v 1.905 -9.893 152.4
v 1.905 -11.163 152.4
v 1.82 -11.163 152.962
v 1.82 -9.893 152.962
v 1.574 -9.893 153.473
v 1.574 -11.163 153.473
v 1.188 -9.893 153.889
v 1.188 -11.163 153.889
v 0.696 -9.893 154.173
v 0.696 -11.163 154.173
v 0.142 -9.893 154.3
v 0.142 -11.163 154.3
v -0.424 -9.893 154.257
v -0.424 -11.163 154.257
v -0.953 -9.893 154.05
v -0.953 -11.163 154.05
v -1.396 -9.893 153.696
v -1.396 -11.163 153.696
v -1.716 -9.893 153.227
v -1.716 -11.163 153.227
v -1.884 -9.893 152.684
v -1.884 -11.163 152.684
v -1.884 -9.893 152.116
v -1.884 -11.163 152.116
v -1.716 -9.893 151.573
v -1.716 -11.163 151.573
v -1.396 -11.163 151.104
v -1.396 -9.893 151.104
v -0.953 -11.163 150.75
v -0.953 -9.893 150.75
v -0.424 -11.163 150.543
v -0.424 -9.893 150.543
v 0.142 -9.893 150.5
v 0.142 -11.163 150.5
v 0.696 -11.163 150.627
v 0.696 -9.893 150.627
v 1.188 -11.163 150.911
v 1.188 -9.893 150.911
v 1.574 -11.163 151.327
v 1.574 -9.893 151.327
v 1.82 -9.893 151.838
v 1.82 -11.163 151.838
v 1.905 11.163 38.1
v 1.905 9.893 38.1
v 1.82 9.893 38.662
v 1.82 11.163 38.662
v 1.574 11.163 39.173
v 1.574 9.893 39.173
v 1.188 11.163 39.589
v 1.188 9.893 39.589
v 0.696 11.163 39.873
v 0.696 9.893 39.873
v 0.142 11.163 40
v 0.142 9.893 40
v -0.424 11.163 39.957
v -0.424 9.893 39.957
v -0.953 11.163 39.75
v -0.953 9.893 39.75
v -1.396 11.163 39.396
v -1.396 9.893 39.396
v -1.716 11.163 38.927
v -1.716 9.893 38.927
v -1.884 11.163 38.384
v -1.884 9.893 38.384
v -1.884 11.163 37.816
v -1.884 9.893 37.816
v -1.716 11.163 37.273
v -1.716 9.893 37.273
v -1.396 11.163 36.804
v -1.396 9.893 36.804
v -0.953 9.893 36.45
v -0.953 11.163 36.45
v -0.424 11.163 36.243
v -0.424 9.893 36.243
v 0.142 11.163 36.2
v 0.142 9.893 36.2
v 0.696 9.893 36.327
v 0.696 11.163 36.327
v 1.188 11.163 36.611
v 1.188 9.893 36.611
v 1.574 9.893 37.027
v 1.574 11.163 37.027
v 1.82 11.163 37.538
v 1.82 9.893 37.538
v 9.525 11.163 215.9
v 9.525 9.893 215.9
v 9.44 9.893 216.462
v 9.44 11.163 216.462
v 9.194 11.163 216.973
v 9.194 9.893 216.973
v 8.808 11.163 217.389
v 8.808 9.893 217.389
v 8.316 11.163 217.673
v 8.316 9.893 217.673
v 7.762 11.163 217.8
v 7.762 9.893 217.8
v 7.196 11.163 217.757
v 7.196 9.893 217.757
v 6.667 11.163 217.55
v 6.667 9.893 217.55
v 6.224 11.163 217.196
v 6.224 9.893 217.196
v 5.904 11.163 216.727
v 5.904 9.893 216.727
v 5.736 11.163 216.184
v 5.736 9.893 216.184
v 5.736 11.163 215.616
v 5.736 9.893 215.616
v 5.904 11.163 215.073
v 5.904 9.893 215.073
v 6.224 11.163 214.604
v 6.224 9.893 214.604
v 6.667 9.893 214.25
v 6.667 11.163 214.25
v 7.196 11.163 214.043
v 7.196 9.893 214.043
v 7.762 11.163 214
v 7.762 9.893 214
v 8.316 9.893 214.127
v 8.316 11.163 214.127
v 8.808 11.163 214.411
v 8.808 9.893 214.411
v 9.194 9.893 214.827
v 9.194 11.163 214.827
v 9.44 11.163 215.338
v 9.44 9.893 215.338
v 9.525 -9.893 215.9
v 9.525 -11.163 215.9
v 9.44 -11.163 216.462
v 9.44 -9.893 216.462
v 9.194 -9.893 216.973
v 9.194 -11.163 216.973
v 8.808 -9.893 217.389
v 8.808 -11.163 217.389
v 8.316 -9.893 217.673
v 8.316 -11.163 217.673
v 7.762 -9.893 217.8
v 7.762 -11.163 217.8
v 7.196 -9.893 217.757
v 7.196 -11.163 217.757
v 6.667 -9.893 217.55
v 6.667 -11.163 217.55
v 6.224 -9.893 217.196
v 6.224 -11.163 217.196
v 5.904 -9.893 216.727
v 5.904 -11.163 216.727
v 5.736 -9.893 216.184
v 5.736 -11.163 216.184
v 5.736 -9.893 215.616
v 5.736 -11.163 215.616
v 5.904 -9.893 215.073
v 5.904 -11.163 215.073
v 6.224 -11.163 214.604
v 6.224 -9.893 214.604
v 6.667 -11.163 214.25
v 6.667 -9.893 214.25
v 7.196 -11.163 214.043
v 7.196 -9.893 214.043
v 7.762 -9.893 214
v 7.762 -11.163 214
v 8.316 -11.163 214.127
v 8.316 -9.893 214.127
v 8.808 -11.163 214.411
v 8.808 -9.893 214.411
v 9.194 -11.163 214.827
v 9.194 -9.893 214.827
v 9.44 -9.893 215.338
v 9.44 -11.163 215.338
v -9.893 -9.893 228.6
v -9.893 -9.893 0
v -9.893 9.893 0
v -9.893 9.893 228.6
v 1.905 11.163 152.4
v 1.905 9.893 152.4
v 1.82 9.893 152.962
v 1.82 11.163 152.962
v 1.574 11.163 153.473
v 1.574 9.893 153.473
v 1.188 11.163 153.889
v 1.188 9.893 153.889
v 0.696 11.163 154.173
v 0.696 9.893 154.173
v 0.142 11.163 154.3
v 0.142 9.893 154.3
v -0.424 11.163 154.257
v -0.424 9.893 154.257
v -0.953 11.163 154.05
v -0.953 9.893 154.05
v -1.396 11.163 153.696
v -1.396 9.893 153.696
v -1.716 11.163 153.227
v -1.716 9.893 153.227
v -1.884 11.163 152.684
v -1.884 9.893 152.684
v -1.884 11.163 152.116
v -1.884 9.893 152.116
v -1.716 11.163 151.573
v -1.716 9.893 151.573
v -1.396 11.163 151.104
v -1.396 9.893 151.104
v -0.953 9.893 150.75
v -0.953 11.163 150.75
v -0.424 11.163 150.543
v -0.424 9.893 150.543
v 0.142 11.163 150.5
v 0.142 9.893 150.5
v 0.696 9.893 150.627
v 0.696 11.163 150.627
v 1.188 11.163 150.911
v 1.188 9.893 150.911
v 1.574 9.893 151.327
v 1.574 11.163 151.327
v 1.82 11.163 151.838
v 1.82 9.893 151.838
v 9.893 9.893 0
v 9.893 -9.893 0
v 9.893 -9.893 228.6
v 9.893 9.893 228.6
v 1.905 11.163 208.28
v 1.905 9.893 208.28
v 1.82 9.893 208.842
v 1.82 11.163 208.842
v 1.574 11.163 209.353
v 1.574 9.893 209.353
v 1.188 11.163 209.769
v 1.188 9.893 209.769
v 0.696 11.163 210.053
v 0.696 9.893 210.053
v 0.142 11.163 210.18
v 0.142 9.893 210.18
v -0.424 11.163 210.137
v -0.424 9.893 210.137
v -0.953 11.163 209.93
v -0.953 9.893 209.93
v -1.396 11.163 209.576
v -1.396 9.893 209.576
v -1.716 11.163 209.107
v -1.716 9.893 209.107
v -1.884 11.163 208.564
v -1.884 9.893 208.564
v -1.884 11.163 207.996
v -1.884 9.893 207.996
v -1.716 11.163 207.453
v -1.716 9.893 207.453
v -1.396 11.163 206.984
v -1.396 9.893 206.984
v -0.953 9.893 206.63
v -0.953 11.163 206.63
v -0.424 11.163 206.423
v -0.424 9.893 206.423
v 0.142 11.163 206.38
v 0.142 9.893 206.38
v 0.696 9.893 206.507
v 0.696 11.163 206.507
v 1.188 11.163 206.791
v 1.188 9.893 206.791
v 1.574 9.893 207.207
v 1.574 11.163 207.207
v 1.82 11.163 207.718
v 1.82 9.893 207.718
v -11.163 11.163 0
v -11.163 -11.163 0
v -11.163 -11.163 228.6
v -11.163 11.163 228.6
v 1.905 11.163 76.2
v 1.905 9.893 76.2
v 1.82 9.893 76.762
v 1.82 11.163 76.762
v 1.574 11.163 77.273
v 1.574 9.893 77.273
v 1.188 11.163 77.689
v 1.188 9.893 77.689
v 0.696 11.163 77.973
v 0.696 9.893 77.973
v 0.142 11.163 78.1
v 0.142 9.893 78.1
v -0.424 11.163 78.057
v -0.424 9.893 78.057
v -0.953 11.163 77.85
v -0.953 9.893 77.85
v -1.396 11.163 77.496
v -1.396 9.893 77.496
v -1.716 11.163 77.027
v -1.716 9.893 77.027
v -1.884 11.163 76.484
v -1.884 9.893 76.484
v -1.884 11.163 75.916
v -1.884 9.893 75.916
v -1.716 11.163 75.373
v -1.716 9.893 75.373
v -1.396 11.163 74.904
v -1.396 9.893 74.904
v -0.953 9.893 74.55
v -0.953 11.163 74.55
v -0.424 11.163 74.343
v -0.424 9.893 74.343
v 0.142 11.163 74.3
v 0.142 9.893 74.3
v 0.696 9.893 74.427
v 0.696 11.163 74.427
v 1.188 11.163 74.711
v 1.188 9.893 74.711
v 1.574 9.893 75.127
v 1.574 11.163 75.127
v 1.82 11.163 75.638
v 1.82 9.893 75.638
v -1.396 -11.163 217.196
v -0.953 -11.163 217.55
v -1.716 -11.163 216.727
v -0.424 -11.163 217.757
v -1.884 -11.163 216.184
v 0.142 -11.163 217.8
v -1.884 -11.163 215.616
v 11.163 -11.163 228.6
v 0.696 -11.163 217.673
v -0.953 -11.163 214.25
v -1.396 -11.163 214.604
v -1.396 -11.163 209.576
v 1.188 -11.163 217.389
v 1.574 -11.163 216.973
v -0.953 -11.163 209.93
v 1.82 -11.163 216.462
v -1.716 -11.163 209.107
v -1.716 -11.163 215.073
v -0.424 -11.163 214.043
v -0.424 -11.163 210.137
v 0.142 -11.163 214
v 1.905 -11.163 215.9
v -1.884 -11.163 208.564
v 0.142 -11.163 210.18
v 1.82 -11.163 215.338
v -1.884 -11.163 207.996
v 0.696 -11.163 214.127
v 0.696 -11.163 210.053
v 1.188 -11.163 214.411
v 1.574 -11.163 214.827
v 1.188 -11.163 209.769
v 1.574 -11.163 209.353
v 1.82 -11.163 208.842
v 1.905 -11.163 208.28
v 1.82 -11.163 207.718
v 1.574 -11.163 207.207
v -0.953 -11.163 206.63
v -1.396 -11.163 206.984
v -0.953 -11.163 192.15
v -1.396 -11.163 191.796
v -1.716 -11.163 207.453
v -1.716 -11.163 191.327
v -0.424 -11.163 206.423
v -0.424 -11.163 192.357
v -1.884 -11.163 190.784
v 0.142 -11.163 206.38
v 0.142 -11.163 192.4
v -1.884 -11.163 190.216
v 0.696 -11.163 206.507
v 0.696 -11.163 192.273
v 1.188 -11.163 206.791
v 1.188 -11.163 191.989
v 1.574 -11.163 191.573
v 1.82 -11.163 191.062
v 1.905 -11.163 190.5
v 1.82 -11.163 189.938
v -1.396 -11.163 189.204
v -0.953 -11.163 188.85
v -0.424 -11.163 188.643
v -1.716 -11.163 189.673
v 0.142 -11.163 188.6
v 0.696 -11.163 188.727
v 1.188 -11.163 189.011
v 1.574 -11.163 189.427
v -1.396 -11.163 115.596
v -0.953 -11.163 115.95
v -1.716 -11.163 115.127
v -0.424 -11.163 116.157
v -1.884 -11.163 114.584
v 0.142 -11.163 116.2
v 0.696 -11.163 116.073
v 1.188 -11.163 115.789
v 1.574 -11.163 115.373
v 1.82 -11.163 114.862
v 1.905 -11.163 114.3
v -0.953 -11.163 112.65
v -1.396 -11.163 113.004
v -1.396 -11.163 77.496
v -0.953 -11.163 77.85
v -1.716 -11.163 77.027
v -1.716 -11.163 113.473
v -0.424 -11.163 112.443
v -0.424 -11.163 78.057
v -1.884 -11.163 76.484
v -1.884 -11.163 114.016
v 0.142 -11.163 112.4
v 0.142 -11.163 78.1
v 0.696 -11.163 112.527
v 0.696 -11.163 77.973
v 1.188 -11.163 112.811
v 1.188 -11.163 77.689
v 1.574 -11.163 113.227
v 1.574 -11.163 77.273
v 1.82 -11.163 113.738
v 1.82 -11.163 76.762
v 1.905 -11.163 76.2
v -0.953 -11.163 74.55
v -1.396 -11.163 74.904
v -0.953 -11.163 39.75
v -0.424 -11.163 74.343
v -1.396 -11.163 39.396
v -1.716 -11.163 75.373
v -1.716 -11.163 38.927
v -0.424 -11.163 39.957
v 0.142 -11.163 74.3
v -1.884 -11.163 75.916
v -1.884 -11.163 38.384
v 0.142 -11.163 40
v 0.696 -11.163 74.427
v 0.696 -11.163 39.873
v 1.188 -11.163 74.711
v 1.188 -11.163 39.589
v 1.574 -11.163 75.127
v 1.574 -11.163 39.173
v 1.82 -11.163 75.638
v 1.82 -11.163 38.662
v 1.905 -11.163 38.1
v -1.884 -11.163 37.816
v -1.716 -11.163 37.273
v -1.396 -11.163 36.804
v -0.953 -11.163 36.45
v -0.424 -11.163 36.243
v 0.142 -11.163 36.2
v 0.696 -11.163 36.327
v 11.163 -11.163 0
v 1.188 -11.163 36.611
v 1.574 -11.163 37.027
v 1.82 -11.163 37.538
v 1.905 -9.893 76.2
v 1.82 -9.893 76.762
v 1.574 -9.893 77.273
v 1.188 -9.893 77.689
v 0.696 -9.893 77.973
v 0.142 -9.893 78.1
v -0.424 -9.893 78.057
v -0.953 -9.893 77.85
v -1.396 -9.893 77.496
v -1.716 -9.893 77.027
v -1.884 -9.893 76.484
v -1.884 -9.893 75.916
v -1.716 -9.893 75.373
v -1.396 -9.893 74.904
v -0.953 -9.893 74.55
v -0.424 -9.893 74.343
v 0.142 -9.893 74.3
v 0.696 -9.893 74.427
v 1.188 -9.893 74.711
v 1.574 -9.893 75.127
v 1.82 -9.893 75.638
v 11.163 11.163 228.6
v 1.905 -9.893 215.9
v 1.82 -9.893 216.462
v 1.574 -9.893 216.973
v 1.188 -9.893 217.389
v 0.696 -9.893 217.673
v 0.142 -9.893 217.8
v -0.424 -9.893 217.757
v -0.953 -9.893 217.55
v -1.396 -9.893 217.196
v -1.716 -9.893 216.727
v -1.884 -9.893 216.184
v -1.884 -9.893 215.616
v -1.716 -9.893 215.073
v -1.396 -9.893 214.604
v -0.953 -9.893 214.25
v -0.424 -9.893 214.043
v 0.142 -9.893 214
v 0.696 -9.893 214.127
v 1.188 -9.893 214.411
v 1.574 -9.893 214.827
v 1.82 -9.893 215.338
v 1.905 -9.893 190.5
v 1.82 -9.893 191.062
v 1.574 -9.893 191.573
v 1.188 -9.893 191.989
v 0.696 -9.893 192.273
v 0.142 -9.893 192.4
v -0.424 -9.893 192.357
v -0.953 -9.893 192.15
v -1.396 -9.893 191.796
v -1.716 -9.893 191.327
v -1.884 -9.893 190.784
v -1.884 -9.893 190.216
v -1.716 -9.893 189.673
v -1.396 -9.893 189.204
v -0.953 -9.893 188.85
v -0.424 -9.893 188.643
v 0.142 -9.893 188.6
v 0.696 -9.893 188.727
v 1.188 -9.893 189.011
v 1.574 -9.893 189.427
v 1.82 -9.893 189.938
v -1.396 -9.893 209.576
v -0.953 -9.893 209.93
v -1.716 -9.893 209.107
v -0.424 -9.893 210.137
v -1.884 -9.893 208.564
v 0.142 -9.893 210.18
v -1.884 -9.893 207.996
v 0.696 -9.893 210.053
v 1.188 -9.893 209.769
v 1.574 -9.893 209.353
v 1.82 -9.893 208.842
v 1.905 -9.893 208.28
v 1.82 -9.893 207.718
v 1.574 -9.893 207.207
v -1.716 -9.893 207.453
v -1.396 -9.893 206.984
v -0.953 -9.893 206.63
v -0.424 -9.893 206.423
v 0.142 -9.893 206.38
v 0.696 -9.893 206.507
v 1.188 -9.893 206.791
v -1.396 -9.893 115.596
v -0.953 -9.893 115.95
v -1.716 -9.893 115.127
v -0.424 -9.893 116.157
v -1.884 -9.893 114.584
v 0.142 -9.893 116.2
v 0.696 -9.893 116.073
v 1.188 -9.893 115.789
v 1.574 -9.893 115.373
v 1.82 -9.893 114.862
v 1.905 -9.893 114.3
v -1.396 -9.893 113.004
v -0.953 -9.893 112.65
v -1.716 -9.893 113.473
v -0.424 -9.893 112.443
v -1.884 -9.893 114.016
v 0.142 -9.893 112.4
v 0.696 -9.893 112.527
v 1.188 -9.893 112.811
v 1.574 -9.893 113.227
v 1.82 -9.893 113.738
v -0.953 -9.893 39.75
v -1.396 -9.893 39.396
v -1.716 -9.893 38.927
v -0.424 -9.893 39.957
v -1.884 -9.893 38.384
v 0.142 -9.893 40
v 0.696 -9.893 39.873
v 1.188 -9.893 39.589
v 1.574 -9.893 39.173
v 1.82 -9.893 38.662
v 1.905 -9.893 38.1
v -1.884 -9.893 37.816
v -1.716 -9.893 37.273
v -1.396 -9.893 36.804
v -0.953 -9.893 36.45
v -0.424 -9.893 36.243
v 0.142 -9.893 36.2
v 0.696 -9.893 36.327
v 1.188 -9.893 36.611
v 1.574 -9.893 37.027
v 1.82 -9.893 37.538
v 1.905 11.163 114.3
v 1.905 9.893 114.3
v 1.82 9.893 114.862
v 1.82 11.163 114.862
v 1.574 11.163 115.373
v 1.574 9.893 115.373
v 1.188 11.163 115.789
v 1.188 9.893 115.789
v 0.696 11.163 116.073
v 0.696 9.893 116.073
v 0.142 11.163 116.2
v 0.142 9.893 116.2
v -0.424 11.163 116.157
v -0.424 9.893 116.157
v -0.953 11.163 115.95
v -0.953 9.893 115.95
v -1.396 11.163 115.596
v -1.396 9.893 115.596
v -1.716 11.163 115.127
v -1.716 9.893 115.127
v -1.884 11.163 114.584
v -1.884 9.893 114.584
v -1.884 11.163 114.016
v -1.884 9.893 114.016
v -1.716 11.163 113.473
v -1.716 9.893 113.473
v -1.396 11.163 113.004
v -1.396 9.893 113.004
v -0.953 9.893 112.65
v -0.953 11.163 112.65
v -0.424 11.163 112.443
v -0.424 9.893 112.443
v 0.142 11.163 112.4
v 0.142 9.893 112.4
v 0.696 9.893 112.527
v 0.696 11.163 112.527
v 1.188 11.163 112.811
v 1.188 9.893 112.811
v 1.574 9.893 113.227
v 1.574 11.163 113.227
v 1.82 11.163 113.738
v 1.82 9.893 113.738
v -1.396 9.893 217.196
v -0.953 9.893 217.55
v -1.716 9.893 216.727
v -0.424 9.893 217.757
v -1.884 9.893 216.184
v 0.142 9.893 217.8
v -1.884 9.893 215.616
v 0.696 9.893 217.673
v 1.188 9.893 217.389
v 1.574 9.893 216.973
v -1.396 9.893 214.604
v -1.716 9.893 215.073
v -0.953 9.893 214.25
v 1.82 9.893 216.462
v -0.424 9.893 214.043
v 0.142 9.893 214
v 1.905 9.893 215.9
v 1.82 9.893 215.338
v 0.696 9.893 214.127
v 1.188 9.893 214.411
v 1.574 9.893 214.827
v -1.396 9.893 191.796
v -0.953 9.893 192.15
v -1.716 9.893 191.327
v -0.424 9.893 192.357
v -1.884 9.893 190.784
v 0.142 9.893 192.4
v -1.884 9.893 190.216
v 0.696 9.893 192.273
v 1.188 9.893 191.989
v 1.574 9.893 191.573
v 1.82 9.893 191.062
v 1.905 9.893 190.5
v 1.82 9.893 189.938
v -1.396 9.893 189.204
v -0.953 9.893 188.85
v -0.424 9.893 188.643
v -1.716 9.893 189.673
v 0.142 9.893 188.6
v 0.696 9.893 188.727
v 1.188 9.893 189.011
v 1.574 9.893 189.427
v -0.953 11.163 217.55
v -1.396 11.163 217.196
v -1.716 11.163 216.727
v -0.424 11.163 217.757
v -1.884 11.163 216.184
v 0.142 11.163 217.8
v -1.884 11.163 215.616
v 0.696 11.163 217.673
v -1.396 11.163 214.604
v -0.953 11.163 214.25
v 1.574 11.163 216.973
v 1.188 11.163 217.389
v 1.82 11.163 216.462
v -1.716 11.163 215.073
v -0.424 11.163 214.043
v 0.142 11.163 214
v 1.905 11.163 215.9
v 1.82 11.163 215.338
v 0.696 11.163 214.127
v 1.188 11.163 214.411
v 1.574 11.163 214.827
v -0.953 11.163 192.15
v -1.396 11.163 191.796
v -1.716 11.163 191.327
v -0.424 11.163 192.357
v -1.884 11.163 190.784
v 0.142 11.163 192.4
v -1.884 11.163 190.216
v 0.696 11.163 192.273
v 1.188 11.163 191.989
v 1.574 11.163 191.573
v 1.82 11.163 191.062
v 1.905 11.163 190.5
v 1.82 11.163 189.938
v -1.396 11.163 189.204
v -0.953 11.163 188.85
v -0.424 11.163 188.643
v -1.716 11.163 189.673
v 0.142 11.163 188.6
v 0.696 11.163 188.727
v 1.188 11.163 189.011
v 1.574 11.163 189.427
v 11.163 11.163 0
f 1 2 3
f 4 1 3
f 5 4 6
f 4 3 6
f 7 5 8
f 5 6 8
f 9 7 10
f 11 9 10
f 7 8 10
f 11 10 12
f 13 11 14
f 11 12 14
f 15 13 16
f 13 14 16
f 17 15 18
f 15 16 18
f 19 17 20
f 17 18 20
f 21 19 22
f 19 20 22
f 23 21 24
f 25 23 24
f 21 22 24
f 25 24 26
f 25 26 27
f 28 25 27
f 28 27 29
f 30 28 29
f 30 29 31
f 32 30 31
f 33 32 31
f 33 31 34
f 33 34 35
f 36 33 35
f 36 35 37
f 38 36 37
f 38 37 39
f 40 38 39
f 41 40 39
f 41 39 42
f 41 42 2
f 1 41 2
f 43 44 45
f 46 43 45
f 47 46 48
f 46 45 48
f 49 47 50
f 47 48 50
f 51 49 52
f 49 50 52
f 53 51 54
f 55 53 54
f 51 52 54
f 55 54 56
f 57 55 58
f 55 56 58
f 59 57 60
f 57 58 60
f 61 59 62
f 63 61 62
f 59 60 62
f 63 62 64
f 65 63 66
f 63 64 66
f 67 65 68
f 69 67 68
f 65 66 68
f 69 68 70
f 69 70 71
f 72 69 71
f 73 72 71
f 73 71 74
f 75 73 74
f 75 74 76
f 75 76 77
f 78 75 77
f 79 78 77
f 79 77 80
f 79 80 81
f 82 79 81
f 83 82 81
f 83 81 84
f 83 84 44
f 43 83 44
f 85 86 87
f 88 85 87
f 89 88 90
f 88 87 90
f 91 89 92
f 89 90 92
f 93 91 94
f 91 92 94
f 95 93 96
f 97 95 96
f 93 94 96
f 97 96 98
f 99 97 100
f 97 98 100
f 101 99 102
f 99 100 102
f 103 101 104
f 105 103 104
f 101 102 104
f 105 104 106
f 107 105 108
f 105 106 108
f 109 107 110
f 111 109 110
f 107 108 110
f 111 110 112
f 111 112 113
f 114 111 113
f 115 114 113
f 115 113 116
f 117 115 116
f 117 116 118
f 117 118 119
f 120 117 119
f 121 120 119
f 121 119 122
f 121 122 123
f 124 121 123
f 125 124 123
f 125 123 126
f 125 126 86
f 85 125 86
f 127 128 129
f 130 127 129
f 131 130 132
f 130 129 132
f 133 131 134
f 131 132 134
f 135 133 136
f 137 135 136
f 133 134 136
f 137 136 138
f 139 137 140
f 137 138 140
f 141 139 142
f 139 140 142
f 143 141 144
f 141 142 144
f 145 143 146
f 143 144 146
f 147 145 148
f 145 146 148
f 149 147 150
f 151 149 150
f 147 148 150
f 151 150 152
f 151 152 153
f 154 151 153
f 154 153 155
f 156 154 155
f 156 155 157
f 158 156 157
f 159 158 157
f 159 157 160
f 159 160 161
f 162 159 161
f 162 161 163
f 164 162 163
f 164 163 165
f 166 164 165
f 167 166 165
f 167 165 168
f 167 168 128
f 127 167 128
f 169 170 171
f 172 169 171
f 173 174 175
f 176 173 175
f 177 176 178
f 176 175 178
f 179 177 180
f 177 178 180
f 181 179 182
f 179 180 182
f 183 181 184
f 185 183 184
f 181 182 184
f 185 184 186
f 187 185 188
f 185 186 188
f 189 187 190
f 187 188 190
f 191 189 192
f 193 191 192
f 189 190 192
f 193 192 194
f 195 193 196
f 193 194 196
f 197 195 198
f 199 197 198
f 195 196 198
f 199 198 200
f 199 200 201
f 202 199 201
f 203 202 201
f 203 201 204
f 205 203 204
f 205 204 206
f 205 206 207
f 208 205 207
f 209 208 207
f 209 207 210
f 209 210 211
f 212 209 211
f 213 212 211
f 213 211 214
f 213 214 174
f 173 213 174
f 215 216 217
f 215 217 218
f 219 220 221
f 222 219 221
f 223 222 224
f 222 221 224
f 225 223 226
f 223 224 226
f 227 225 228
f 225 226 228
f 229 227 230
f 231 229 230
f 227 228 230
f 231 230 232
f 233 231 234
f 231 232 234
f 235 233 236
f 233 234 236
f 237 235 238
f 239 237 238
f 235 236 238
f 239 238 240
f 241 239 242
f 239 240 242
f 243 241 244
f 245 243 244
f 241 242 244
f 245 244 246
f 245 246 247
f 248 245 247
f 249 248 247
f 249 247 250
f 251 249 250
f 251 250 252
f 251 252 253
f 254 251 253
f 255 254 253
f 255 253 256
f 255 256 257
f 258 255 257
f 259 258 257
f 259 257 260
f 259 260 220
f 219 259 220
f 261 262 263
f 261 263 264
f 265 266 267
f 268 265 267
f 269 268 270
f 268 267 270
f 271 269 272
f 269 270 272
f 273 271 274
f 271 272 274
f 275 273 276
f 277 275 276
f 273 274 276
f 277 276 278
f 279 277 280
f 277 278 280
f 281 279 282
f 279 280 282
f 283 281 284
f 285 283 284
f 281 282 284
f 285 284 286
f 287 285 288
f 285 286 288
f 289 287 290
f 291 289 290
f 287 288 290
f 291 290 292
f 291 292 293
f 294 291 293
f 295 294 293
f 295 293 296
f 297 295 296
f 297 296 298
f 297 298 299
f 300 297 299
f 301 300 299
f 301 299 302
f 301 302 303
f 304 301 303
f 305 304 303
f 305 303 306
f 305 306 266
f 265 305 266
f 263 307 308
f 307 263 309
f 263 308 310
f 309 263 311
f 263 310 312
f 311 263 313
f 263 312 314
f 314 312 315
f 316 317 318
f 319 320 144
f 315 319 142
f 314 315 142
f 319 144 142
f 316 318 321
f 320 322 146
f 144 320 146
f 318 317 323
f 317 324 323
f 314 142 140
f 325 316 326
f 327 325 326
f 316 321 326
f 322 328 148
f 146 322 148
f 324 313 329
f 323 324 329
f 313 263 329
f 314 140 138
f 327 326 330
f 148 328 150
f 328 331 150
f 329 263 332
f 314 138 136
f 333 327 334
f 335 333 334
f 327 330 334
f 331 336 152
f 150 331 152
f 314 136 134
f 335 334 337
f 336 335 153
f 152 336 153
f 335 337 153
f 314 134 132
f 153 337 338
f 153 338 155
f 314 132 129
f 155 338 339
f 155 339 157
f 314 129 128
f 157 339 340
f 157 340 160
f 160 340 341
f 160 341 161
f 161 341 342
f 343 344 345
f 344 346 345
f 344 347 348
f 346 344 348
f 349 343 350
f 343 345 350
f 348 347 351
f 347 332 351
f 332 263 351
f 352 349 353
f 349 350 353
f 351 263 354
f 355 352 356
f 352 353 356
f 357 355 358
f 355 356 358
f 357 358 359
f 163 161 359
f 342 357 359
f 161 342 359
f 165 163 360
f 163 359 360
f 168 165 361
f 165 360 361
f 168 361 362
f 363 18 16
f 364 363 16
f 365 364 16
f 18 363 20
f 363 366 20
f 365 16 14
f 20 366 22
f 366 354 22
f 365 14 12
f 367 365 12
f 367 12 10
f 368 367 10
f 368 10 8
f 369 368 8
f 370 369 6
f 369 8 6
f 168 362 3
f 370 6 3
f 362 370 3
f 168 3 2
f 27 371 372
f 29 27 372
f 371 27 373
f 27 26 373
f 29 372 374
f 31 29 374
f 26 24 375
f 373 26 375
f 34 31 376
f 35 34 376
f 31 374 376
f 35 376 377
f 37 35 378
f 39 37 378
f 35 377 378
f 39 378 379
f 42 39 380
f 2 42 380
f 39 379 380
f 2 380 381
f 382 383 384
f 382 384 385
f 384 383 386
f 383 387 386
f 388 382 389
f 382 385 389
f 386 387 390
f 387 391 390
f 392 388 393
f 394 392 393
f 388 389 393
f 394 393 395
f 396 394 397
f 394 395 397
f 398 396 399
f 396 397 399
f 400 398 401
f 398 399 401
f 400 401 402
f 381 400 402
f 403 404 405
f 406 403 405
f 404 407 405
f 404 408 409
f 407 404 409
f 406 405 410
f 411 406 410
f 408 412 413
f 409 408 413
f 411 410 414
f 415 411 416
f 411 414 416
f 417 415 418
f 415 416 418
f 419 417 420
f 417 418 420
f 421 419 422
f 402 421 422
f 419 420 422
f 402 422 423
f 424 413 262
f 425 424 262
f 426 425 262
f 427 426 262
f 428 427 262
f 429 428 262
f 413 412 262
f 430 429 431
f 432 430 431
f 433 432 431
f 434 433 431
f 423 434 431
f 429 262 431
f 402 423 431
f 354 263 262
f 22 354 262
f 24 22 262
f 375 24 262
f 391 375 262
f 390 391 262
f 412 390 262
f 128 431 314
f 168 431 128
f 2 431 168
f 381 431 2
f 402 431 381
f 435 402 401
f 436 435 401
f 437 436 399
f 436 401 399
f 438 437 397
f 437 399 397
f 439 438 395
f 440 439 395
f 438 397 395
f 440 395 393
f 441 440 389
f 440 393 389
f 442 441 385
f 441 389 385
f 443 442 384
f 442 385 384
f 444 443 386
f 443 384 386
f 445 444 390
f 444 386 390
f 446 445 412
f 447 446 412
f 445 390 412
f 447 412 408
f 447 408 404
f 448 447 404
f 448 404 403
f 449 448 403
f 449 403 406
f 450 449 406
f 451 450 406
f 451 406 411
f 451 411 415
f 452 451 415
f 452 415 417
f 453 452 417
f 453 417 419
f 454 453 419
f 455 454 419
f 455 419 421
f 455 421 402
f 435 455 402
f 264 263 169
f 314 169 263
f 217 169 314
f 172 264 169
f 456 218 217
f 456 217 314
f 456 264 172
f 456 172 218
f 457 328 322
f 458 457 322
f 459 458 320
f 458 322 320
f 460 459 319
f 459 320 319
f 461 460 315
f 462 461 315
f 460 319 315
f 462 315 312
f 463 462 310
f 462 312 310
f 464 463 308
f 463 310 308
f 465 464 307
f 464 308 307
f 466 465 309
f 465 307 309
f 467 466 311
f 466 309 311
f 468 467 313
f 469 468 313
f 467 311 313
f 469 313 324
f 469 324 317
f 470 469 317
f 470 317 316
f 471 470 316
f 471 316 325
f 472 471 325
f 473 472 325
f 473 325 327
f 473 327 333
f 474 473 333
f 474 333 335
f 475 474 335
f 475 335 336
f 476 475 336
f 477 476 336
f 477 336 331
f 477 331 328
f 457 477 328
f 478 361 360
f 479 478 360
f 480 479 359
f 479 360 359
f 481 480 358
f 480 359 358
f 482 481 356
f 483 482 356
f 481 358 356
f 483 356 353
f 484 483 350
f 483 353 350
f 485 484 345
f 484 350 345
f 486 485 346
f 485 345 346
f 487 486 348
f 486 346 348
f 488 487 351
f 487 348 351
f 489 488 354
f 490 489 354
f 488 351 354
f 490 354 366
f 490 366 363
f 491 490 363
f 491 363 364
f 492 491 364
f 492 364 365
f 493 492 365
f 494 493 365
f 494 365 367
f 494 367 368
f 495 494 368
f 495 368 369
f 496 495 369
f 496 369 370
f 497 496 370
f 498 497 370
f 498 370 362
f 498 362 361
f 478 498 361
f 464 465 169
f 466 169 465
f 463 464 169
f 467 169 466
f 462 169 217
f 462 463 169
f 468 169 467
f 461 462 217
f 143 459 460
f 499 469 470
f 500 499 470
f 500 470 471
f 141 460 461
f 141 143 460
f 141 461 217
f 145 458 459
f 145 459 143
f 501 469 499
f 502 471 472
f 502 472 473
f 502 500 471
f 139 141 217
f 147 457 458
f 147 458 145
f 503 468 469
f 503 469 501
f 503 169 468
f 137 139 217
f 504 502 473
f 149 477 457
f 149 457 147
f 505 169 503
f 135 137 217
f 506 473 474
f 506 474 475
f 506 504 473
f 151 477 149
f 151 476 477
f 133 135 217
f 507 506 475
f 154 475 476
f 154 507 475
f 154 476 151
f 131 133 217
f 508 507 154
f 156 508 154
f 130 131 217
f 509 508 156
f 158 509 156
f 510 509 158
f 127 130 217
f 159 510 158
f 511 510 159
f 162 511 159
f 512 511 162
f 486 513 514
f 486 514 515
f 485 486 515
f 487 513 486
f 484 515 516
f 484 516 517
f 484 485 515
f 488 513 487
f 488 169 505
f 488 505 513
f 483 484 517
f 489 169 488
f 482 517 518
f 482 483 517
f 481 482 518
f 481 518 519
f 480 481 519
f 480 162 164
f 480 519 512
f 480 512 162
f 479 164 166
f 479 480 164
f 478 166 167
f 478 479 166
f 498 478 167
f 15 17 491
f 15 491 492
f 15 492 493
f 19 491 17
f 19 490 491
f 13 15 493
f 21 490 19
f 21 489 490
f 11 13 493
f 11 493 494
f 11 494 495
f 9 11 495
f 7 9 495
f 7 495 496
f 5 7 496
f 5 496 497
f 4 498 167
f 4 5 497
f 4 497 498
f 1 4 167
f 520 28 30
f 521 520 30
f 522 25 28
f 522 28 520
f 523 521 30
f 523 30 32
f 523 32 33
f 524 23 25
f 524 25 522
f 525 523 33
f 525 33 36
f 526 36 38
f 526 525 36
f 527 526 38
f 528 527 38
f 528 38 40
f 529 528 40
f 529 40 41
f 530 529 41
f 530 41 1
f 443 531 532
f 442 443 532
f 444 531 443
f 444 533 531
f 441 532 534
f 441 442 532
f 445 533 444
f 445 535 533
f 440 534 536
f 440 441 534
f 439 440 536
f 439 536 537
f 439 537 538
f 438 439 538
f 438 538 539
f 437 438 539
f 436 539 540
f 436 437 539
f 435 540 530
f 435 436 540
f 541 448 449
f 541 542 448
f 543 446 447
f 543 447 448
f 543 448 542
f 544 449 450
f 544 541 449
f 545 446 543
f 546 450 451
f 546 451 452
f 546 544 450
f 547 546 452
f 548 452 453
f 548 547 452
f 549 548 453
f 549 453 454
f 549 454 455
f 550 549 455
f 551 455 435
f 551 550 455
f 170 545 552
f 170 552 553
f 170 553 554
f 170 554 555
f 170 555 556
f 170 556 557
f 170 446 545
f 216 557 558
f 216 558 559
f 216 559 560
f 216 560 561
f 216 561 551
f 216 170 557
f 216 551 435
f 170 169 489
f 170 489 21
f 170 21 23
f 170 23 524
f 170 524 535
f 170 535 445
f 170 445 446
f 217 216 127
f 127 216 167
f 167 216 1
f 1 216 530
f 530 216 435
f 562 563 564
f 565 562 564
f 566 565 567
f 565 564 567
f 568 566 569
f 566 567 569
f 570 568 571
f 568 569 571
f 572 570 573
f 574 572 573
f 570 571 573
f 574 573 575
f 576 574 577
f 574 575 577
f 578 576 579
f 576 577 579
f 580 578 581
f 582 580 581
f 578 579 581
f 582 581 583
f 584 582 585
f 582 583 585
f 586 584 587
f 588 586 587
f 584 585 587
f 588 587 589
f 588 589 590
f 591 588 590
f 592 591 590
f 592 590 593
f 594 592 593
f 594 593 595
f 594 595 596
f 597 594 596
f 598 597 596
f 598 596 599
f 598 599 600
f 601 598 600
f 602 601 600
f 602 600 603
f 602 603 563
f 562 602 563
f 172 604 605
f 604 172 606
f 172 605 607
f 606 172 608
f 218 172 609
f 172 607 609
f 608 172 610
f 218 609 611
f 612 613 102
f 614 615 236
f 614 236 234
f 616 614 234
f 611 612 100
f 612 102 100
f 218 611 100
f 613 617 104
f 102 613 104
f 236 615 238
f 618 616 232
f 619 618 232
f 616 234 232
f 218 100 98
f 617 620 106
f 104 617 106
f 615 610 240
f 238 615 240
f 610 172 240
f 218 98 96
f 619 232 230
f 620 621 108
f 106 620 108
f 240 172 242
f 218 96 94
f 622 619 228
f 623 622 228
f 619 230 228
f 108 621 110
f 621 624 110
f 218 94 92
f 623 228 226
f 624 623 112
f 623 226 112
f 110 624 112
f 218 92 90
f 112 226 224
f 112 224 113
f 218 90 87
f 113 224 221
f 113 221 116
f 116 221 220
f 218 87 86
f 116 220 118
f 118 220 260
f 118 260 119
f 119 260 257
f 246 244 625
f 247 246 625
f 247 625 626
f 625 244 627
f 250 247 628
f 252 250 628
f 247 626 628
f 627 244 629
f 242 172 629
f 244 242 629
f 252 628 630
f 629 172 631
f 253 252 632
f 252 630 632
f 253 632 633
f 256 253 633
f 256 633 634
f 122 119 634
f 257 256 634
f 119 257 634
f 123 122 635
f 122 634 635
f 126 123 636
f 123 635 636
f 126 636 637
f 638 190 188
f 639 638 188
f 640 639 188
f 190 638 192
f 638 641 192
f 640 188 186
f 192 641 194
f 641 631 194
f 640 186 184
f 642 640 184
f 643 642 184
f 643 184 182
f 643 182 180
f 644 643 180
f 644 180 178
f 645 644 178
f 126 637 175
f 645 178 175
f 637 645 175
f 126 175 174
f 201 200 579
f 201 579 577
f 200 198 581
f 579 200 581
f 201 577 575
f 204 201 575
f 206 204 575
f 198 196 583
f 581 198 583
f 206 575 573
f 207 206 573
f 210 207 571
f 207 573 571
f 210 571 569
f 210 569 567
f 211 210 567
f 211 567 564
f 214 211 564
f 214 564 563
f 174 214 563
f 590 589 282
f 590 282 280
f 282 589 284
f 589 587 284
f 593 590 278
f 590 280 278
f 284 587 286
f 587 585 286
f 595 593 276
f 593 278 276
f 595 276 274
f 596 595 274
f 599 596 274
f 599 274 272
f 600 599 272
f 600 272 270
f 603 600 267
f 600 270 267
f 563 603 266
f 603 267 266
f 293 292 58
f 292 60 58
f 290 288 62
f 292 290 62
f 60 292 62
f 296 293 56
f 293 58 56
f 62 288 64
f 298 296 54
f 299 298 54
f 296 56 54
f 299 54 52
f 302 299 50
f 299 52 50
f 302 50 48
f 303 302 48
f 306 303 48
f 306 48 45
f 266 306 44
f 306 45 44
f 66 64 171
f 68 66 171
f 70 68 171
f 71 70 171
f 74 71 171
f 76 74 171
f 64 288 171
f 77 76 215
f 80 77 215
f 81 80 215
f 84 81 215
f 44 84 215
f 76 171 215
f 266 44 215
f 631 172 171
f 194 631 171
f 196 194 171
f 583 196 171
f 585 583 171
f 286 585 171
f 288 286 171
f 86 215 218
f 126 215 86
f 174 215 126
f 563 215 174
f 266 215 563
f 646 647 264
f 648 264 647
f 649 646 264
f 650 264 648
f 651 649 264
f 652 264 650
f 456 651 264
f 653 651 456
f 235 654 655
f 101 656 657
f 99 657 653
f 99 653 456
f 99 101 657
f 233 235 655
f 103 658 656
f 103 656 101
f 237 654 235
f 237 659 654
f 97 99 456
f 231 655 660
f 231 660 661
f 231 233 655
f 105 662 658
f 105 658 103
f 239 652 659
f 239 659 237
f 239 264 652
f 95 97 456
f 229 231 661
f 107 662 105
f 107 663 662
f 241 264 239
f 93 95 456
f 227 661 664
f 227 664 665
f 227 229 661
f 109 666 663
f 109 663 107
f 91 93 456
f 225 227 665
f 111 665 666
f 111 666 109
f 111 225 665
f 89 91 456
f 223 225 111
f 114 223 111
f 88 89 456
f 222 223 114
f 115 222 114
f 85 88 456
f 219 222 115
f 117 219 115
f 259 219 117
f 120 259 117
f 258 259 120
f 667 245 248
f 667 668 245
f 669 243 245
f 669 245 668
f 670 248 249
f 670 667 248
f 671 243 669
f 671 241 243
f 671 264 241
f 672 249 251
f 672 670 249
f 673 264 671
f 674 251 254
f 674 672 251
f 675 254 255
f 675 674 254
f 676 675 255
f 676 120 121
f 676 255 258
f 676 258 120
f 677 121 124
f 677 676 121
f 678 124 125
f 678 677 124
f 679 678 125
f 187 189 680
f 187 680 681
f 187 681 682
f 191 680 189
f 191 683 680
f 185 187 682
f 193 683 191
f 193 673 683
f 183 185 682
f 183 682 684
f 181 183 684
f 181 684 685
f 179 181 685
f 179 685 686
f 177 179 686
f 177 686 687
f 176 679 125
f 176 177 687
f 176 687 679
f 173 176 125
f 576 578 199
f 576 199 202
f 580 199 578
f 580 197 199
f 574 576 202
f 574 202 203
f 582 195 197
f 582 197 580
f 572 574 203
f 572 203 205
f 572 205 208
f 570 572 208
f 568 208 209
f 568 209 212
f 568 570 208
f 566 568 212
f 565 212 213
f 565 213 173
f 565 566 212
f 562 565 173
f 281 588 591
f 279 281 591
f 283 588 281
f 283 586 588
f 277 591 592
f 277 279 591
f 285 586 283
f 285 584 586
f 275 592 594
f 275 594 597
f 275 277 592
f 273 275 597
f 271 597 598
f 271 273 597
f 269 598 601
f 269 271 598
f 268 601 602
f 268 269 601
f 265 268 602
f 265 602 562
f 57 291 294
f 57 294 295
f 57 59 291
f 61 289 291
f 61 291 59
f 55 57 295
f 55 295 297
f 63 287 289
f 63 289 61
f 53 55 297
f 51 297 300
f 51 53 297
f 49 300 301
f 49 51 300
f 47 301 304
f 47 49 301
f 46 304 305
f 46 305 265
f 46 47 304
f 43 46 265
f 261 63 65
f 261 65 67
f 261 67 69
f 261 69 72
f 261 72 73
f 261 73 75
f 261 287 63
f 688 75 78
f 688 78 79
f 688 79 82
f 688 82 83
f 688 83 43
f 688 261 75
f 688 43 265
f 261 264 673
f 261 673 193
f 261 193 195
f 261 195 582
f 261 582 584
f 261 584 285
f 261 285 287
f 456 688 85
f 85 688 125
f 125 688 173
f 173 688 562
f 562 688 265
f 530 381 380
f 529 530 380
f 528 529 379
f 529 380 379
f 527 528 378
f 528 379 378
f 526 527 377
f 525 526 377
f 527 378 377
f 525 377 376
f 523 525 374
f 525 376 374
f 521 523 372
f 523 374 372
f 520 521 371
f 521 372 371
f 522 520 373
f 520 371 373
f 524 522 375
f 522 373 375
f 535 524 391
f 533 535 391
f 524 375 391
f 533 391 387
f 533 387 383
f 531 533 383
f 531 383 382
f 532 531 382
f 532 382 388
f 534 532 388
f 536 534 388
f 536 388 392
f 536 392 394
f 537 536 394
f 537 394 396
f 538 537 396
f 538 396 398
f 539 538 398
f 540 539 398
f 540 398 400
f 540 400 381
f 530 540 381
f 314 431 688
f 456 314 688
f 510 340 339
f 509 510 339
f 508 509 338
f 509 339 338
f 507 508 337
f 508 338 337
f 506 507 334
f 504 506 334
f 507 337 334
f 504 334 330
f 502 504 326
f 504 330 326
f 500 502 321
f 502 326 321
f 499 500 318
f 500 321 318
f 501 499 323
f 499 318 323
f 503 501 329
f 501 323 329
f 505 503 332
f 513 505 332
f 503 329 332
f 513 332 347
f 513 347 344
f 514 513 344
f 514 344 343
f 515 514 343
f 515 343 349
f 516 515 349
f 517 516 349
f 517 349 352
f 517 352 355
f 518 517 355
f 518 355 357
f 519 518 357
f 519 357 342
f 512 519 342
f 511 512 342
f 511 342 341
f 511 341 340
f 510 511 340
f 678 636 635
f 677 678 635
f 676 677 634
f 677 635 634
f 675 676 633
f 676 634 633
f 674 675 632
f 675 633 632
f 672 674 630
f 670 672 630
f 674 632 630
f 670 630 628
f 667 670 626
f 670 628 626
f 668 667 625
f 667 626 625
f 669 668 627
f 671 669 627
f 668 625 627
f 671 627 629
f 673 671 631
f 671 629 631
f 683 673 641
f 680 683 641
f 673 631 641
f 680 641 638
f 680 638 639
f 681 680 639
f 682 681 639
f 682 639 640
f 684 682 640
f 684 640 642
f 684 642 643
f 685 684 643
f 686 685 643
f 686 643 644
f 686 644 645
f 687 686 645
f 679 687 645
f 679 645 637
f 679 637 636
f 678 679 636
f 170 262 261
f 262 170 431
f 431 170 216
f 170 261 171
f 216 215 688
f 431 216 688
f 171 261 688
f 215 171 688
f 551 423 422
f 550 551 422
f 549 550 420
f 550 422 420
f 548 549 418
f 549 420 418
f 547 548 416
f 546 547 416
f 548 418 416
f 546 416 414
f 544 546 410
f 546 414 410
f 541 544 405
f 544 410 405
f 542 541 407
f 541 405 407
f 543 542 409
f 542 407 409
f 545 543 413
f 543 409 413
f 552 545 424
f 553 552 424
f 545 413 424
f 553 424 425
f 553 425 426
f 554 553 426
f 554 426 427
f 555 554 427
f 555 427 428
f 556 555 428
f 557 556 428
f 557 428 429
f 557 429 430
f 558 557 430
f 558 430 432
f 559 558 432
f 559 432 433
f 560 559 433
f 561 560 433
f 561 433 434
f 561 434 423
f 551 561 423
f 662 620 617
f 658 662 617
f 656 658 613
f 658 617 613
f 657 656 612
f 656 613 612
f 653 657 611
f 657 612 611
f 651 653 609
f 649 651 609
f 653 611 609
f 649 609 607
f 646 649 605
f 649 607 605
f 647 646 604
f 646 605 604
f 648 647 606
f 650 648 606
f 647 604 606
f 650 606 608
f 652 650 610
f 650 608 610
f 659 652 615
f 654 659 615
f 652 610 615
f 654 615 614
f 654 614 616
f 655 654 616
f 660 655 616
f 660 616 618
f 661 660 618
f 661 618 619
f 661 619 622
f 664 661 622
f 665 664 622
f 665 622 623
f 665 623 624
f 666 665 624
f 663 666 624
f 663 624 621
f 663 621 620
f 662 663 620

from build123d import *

# Parameters (mm, degrees)
F0_W     = 22.3266
F0_H     = 22.3266
F0_W_2   = 19.7866
F0_H_2   = 19.7866
F1_DEPTH = 228.6
F2_R     = 1.905
F3_DEPTH = 22.3276
F4_R     = 1.905
F5_DEPTH = 22.3276


with BuildPart() as f1:
    # F0 (on Top) → F1 (new body)
    with BuildSketch(Plane.XY):
        Rectangle(F0_W, F0_H)
        Rectangle(F0_W_2, F0_H_2, mode=Mode.SUBTRACT)
    extrude(amount=F1_DEPTH)

    # F2 (on face) → F3 (cut, through all)
    with BuildSketch(Plane.XZ.offset(11.1633)):
        with Locations((0, 38.1)):
            Circle(F2_R)
        with Locations((0, 76.2)):
            Circle(F2_R)
        with Locations((0, 114.3)):
            Circle(F2_R)
        with Locations((0, 152.4)):
            Circle(F2_R)
        with Locations((0, 190.5)):
            Circle(F2_R)
    extrude(amount=-F3_DEPTH, mode=Mode.SUBTRACT)

    # F4 (on face) → F5 (cut, through all)
    with BuildSketch(Plane.XZ.offset(11.1633)):
        with Locations((0, 215.9)):
            Circle(F4_R)
        with Locations((7.62, 215.9)):
            Circle(F4_R)
        with Locations((0, 208.28)):
            Circle(F4_R)
    extrude(amount=-F5_DEPTH, mode=Mode.SUBTRACT)


solid = f1.part
